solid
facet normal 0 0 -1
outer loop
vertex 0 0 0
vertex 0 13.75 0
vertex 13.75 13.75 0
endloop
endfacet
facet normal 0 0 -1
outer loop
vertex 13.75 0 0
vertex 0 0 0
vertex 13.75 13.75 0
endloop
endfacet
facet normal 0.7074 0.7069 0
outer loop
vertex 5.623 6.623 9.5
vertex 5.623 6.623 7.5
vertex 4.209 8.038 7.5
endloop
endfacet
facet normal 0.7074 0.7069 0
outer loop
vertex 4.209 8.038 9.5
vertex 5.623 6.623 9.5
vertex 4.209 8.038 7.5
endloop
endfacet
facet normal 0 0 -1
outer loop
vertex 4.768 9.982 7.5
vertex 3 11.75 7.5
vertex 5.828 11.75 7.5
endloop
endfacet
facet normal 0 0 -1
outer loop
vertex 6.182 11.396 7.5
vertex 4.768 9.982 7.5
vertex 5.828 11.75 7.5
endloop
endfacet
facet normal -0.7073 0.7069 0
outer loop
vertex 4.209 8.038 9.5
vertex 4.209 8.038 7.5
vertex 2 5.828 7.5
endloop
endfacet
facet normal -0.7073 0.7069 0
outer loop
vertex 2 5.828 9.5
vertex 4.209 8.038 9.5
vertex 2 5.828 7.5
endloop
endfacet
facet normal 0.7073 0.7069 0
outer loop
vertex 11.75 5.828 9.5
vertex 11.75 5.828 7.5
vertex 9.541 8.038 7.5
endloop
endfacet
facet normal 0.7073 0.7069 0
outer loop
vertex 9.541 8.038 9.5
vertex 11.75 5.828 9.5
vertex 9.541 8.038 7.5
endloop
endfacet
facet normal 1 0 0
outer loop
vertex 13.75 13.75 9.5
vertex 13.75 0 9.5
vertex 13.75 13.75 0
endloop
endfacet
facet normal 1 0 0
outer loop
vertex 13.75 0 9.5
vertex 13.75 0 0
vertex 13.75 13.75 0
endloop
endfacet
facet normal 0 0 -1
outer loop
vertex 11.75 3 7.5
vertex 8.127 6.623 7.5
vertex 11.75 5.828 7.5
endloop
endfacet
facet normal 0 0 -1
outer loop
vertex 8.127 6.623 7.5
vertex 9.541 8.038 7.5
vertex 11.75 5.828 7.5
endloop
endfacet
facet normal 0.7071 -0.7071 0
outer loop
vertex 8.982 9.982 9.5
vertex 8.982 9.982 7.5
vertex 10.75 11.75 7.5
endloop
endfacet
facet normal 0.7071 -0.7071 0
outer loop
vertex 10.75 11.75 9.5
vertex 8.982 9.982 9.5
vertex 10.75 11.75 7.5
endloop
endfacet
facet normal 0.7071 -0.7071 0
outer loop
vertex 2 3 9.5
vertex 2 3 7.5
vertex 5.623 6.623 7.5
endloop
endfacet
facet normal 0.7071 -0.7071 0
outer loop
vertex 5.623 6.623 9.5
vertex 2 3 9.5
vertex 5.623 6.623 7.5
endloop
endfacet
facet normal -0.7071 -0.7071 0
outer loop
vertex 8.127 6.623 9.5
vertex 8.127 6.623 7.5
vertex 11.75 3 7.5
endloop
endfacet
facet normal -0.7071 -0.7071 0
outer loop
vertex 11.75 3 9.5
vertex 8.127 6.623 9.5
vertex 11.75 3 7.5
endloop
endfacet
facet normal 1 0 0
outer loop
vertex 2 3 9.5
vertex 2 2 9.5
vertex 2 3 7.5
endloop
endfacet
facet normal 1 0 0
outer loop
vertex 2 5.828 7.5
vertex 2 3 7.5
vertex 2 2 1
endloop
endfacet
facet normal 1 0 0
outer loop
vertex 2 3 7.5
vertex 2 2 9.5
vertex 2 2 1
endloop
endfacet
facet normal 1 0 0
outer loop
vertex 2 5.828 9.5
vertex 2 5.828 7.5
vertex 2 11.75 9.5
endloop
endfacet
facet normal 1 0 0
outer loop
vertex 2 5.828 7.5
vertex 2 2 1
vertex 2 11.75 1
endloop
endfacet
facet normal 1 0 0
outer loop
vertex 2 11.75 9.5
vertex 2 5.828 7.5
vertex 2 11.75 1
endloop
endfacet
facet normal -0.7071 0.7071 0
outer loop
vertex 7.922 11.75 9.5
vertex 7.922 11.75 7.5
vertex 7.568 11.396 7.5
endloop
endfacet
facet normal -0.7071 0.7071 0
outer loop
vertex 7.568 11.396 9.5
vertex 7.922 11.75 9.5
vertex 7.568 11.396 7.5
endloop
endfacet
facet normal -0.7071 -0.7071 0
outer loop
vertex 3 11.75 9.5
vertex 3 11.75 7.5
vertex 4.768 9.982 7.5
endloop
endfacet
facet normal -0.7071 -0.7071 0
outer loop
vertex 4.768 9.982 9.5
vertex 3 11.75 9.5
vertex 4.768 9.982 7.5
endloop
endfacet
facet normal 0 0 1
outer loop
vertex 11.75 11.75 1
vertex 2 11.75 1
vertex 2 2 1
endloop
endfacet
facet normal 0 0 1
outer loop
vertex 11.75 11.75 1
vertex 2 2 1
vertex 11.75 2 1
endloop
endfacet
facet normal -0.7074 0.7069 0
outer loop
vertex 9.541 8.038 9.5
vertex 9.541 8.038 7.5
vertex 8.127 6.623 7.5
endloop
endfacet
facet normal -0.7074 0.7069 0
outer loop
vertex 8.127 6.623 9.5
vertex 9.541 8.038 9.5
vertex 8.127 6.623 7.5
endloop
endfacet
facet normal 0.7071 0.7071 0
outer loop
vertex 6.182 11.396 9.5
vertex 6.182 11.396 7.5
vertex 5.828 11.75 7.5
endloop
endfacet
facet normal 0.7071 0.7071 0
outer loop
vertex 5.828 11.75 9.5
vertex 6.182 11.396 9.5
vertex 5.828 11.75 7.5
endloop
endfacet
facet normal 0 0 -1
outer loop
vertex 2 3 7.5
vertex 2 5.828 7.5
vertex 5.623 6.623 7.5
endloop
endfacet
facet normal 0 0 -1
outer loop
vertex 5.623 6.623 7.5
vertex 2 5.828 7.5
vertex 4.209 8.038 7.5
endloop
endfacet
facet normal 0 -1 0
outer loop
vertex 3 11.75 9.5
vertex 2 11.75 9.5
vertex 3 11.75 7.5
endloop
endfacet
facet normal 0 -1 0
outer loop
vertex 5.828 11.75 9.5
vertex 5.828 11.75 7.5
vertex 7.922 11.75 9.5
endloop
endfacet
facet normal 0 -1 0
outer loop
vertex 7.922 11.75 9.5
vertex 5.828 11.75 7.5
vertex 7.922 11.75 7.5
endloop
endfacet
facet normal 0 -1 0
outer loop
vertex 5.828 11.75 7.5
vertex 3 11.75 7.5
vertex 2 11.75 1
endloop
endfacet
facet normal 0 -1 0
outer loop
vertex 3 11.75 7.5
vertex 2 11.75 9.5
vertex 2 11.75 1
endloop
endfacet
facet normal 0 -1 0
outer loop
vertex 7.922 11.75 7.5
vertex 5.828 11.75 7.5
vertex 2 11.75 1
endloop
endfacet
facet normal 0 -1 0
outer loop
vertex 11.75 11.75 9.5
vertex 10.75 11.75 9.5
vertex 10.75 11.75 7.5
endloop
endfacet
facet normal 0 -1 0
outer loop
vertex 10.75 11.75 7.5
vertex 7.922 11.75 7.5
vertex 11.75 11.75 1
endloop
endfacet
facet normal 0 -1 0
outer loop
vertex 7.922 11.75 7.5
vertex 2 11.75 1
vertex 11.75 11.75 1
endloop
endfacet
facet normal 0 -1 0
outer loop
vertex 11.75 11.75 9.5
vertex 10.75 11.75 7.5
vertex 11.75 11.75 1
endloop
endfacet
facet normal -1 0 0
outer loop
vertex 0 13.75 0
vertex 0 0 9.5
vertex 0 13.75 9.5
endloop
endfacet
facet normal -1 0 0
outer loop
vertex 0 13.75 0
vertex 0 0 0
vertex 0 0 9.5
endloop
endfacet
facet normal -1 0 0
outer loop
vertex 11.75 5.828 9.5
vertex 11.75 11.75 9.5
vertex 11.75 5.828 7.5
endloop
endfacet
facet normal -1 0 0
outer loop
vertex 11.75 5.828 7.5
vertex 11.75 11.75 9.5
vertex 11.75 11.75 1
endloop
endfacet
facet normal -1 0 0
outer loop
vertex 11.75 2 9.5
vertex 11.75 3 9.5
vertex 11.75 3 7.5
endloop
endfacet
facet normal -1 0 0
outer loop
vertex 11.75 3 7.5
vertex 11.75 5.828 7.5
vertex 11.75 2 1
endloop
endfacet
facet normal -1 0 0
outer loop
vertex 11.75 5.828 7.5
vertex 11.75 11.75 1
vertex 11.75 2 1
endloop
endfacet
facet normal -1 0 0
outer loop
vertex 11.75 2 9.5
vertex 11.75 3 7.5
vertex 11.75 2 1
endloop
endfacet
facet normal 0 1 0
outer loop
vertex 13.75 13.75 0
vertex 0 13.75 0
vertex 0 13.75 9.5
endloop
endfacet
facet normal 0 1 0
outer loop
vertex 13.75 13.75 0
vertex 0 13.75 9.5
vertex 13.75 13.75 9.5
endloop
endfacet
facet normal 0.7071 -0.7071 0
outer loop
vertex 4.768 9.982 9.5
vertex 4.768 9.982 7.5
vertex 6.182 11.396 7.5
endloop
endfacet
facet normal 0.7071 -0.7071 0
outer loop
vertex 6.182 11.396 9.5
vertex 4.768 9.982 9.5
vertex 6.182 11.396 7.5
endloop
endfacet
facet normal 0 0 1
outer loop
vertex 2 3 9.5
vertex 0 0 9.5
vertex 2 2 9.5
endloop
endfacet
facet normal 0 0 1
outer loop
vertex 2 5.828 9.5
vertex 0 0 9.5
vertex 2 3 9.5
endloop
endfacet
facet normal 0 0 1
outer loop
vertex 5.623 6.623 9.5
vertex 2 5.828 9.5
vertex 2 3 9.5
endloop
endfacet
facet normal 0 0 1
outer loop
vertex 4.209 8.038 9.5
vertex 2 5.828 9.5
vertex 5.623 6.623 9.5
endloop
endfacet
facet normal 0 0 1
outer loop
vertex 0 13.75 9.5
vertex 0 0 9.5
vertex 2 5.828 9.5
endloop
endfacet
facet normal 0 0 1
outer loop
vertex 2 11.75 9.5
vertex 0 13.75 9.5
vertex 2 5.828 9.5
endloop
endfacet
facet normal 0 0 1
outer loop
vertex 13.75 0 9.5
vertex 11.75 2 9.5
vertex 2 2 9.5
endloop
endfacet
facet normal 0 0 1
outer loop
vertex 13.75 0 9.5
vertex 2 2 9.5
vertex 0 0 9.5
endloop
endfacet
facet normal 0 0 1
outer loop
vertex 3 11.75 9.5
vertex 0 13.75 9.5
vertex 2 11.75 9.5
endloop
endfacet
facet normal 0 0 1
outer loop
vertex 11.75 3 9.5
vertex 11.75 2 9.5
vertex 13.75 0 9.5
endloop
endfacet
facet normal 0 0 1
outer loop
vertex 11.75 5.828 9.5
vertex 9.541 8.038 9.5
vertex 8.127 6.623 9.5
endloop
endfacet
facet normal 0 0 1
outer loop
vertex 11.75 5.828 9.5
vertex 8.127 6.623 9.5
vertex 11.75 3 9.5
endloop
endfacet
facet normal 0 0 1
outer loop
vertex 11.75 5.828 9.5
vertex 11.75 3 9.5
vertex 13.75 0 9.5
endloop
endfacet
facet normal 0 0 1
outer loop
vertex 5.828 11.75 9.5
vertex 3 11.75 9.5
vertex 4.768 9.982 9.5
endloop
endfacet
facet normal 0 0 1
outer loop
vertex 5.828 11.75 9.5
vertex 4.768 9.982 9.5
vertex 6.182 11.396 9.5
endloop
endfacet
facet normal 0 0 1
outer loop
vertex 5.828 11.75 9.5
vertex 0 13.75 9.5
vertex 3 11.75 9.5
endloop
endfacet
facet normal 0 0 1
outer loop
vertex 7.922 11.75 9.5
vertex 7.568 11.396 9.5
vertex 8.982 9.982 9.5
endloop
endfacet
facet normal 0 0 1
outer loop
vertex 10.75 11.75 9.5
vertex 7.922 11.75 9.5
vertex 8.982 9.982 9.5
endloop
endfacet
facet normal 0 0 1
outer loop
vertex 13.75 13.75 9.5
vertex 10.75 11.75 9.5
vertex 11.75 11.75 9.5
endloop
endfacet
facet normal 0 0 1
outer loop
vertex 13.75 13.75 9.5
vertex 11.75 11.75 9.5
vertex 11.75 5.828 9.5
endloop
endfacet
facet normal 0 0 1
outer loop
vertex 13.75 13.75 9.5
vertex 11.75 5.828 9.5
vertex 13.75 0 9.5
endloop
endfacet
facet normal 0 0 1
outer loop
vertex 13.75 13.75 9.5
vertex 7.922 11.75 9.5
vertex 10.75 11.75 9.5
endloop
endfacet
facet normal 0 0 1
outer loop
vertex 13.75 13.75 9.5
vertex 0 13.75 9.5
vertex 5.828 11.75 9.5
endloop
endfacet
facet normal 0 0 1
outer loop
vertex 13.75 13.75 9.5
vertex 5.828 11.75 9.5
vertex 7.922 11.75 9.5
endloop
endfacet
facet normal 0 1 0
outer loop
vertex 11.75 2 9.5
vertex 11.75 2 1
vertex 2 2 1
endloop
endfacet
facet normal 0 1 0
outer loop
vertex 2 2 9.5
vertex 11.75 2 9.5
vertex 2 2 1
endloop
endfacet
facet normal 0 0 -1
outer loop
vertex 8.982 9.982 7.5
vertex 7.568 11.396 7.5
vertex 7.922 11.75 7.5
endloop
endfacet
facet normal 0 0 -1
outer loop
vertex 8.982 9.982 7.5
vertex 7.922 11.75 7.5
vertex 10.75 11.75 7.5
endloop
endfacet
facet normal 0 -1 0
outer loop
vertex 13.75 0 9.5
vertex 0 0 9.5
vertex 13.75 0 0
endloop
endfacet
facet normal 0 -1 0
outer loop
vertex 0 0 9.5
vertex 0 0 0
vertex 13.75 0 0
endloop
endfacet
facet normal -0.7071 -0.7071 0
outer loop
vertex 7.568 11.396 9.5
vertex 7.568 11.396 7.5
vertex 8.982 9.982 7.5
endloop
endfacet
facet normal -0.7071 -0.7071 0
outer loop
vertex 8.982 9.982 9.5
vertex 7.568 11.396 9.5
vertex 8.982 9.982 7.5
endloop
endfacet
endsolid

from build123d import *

# Parameters (mm, degrees)
SKETCH1_W               = 13.75
SKETCH1_H               = 13.75
BASEBOSS_EXTRUDE1_DEPTH = 1
WALLSSKETCH2_W          = 13.75
WALLSSKETCH2_H          = 13.75
WALLSSKETCH2_W_2        = 9.75
WALLSSKETCH2_H_2        = 9.75
BOSS_EXTRUDE2_DEPTH     = 6.5
SKETCH3_W               = 13.75
SKETCH3_H               = 13.75
BOSS_EXTRUDE3_DEPTH     = 2


with BuildPart() as part:
    # Sketch1 → BaseBoss-Extrude1 (new body)
    with BuildSketch(Plane.XY):
        with Locations((6.875, 6.875)):
            Rectangle(SKETCH1_W, SKETCH1_H)
    extrude(amount=BASEBOSS_EXTRUDE1_DEPTH)

    # WallsSketch2 → Boss-Extrude2 (add)
    with BuildSketch(Plane.XY.offset(1)):
        with Locations((6.875, 6.875)):
            Rectangle(WALLSSKETCH2_W, WALLSSKETCH2_H)
        with Locations((6.875, 6.875)):
            Rectangle(WALLSSKETCH2_W_2, WALLSSKETCH2_H_2, mode=Mode.SUBTRACT)
    extrude(amount=BOSS_EXTRUDE2_DEPTH)

    # Sketch3 → Boss-Extrude3 (add)
    with BuildSketch(Plane.XY.offset(7.5)):
        with Locations((6.875, 6.875)):
            Rectangle(SKETCH3_W, SKETCH3_H)
        Polygon((2, 3), (5.623475836, 6.623475836), (4.209262274, 8.037689399), (2, 5.828427125), (2, 11.75), (3, 11.75), (4.767766953, 9.982233047), (6.181980515, 11.396446609), (5.828427125, 11.75), (7.921572875, 11.75), (7.568019485, 11.396446609), (8.982233047, 9.982233047), (10.75, 11.75), (11.75, 11.75), (11.75, 5.828427125), (9.540737726, 8.037689399), (8.126524164, 6.623475836), (11.75, 3), (11.75, 2), (2, 2), align=None, mode=Mode.SUBTRACT)
    extrude(amount=BOSS_EXTRUDE3_DEPTH)


solid = part.part
